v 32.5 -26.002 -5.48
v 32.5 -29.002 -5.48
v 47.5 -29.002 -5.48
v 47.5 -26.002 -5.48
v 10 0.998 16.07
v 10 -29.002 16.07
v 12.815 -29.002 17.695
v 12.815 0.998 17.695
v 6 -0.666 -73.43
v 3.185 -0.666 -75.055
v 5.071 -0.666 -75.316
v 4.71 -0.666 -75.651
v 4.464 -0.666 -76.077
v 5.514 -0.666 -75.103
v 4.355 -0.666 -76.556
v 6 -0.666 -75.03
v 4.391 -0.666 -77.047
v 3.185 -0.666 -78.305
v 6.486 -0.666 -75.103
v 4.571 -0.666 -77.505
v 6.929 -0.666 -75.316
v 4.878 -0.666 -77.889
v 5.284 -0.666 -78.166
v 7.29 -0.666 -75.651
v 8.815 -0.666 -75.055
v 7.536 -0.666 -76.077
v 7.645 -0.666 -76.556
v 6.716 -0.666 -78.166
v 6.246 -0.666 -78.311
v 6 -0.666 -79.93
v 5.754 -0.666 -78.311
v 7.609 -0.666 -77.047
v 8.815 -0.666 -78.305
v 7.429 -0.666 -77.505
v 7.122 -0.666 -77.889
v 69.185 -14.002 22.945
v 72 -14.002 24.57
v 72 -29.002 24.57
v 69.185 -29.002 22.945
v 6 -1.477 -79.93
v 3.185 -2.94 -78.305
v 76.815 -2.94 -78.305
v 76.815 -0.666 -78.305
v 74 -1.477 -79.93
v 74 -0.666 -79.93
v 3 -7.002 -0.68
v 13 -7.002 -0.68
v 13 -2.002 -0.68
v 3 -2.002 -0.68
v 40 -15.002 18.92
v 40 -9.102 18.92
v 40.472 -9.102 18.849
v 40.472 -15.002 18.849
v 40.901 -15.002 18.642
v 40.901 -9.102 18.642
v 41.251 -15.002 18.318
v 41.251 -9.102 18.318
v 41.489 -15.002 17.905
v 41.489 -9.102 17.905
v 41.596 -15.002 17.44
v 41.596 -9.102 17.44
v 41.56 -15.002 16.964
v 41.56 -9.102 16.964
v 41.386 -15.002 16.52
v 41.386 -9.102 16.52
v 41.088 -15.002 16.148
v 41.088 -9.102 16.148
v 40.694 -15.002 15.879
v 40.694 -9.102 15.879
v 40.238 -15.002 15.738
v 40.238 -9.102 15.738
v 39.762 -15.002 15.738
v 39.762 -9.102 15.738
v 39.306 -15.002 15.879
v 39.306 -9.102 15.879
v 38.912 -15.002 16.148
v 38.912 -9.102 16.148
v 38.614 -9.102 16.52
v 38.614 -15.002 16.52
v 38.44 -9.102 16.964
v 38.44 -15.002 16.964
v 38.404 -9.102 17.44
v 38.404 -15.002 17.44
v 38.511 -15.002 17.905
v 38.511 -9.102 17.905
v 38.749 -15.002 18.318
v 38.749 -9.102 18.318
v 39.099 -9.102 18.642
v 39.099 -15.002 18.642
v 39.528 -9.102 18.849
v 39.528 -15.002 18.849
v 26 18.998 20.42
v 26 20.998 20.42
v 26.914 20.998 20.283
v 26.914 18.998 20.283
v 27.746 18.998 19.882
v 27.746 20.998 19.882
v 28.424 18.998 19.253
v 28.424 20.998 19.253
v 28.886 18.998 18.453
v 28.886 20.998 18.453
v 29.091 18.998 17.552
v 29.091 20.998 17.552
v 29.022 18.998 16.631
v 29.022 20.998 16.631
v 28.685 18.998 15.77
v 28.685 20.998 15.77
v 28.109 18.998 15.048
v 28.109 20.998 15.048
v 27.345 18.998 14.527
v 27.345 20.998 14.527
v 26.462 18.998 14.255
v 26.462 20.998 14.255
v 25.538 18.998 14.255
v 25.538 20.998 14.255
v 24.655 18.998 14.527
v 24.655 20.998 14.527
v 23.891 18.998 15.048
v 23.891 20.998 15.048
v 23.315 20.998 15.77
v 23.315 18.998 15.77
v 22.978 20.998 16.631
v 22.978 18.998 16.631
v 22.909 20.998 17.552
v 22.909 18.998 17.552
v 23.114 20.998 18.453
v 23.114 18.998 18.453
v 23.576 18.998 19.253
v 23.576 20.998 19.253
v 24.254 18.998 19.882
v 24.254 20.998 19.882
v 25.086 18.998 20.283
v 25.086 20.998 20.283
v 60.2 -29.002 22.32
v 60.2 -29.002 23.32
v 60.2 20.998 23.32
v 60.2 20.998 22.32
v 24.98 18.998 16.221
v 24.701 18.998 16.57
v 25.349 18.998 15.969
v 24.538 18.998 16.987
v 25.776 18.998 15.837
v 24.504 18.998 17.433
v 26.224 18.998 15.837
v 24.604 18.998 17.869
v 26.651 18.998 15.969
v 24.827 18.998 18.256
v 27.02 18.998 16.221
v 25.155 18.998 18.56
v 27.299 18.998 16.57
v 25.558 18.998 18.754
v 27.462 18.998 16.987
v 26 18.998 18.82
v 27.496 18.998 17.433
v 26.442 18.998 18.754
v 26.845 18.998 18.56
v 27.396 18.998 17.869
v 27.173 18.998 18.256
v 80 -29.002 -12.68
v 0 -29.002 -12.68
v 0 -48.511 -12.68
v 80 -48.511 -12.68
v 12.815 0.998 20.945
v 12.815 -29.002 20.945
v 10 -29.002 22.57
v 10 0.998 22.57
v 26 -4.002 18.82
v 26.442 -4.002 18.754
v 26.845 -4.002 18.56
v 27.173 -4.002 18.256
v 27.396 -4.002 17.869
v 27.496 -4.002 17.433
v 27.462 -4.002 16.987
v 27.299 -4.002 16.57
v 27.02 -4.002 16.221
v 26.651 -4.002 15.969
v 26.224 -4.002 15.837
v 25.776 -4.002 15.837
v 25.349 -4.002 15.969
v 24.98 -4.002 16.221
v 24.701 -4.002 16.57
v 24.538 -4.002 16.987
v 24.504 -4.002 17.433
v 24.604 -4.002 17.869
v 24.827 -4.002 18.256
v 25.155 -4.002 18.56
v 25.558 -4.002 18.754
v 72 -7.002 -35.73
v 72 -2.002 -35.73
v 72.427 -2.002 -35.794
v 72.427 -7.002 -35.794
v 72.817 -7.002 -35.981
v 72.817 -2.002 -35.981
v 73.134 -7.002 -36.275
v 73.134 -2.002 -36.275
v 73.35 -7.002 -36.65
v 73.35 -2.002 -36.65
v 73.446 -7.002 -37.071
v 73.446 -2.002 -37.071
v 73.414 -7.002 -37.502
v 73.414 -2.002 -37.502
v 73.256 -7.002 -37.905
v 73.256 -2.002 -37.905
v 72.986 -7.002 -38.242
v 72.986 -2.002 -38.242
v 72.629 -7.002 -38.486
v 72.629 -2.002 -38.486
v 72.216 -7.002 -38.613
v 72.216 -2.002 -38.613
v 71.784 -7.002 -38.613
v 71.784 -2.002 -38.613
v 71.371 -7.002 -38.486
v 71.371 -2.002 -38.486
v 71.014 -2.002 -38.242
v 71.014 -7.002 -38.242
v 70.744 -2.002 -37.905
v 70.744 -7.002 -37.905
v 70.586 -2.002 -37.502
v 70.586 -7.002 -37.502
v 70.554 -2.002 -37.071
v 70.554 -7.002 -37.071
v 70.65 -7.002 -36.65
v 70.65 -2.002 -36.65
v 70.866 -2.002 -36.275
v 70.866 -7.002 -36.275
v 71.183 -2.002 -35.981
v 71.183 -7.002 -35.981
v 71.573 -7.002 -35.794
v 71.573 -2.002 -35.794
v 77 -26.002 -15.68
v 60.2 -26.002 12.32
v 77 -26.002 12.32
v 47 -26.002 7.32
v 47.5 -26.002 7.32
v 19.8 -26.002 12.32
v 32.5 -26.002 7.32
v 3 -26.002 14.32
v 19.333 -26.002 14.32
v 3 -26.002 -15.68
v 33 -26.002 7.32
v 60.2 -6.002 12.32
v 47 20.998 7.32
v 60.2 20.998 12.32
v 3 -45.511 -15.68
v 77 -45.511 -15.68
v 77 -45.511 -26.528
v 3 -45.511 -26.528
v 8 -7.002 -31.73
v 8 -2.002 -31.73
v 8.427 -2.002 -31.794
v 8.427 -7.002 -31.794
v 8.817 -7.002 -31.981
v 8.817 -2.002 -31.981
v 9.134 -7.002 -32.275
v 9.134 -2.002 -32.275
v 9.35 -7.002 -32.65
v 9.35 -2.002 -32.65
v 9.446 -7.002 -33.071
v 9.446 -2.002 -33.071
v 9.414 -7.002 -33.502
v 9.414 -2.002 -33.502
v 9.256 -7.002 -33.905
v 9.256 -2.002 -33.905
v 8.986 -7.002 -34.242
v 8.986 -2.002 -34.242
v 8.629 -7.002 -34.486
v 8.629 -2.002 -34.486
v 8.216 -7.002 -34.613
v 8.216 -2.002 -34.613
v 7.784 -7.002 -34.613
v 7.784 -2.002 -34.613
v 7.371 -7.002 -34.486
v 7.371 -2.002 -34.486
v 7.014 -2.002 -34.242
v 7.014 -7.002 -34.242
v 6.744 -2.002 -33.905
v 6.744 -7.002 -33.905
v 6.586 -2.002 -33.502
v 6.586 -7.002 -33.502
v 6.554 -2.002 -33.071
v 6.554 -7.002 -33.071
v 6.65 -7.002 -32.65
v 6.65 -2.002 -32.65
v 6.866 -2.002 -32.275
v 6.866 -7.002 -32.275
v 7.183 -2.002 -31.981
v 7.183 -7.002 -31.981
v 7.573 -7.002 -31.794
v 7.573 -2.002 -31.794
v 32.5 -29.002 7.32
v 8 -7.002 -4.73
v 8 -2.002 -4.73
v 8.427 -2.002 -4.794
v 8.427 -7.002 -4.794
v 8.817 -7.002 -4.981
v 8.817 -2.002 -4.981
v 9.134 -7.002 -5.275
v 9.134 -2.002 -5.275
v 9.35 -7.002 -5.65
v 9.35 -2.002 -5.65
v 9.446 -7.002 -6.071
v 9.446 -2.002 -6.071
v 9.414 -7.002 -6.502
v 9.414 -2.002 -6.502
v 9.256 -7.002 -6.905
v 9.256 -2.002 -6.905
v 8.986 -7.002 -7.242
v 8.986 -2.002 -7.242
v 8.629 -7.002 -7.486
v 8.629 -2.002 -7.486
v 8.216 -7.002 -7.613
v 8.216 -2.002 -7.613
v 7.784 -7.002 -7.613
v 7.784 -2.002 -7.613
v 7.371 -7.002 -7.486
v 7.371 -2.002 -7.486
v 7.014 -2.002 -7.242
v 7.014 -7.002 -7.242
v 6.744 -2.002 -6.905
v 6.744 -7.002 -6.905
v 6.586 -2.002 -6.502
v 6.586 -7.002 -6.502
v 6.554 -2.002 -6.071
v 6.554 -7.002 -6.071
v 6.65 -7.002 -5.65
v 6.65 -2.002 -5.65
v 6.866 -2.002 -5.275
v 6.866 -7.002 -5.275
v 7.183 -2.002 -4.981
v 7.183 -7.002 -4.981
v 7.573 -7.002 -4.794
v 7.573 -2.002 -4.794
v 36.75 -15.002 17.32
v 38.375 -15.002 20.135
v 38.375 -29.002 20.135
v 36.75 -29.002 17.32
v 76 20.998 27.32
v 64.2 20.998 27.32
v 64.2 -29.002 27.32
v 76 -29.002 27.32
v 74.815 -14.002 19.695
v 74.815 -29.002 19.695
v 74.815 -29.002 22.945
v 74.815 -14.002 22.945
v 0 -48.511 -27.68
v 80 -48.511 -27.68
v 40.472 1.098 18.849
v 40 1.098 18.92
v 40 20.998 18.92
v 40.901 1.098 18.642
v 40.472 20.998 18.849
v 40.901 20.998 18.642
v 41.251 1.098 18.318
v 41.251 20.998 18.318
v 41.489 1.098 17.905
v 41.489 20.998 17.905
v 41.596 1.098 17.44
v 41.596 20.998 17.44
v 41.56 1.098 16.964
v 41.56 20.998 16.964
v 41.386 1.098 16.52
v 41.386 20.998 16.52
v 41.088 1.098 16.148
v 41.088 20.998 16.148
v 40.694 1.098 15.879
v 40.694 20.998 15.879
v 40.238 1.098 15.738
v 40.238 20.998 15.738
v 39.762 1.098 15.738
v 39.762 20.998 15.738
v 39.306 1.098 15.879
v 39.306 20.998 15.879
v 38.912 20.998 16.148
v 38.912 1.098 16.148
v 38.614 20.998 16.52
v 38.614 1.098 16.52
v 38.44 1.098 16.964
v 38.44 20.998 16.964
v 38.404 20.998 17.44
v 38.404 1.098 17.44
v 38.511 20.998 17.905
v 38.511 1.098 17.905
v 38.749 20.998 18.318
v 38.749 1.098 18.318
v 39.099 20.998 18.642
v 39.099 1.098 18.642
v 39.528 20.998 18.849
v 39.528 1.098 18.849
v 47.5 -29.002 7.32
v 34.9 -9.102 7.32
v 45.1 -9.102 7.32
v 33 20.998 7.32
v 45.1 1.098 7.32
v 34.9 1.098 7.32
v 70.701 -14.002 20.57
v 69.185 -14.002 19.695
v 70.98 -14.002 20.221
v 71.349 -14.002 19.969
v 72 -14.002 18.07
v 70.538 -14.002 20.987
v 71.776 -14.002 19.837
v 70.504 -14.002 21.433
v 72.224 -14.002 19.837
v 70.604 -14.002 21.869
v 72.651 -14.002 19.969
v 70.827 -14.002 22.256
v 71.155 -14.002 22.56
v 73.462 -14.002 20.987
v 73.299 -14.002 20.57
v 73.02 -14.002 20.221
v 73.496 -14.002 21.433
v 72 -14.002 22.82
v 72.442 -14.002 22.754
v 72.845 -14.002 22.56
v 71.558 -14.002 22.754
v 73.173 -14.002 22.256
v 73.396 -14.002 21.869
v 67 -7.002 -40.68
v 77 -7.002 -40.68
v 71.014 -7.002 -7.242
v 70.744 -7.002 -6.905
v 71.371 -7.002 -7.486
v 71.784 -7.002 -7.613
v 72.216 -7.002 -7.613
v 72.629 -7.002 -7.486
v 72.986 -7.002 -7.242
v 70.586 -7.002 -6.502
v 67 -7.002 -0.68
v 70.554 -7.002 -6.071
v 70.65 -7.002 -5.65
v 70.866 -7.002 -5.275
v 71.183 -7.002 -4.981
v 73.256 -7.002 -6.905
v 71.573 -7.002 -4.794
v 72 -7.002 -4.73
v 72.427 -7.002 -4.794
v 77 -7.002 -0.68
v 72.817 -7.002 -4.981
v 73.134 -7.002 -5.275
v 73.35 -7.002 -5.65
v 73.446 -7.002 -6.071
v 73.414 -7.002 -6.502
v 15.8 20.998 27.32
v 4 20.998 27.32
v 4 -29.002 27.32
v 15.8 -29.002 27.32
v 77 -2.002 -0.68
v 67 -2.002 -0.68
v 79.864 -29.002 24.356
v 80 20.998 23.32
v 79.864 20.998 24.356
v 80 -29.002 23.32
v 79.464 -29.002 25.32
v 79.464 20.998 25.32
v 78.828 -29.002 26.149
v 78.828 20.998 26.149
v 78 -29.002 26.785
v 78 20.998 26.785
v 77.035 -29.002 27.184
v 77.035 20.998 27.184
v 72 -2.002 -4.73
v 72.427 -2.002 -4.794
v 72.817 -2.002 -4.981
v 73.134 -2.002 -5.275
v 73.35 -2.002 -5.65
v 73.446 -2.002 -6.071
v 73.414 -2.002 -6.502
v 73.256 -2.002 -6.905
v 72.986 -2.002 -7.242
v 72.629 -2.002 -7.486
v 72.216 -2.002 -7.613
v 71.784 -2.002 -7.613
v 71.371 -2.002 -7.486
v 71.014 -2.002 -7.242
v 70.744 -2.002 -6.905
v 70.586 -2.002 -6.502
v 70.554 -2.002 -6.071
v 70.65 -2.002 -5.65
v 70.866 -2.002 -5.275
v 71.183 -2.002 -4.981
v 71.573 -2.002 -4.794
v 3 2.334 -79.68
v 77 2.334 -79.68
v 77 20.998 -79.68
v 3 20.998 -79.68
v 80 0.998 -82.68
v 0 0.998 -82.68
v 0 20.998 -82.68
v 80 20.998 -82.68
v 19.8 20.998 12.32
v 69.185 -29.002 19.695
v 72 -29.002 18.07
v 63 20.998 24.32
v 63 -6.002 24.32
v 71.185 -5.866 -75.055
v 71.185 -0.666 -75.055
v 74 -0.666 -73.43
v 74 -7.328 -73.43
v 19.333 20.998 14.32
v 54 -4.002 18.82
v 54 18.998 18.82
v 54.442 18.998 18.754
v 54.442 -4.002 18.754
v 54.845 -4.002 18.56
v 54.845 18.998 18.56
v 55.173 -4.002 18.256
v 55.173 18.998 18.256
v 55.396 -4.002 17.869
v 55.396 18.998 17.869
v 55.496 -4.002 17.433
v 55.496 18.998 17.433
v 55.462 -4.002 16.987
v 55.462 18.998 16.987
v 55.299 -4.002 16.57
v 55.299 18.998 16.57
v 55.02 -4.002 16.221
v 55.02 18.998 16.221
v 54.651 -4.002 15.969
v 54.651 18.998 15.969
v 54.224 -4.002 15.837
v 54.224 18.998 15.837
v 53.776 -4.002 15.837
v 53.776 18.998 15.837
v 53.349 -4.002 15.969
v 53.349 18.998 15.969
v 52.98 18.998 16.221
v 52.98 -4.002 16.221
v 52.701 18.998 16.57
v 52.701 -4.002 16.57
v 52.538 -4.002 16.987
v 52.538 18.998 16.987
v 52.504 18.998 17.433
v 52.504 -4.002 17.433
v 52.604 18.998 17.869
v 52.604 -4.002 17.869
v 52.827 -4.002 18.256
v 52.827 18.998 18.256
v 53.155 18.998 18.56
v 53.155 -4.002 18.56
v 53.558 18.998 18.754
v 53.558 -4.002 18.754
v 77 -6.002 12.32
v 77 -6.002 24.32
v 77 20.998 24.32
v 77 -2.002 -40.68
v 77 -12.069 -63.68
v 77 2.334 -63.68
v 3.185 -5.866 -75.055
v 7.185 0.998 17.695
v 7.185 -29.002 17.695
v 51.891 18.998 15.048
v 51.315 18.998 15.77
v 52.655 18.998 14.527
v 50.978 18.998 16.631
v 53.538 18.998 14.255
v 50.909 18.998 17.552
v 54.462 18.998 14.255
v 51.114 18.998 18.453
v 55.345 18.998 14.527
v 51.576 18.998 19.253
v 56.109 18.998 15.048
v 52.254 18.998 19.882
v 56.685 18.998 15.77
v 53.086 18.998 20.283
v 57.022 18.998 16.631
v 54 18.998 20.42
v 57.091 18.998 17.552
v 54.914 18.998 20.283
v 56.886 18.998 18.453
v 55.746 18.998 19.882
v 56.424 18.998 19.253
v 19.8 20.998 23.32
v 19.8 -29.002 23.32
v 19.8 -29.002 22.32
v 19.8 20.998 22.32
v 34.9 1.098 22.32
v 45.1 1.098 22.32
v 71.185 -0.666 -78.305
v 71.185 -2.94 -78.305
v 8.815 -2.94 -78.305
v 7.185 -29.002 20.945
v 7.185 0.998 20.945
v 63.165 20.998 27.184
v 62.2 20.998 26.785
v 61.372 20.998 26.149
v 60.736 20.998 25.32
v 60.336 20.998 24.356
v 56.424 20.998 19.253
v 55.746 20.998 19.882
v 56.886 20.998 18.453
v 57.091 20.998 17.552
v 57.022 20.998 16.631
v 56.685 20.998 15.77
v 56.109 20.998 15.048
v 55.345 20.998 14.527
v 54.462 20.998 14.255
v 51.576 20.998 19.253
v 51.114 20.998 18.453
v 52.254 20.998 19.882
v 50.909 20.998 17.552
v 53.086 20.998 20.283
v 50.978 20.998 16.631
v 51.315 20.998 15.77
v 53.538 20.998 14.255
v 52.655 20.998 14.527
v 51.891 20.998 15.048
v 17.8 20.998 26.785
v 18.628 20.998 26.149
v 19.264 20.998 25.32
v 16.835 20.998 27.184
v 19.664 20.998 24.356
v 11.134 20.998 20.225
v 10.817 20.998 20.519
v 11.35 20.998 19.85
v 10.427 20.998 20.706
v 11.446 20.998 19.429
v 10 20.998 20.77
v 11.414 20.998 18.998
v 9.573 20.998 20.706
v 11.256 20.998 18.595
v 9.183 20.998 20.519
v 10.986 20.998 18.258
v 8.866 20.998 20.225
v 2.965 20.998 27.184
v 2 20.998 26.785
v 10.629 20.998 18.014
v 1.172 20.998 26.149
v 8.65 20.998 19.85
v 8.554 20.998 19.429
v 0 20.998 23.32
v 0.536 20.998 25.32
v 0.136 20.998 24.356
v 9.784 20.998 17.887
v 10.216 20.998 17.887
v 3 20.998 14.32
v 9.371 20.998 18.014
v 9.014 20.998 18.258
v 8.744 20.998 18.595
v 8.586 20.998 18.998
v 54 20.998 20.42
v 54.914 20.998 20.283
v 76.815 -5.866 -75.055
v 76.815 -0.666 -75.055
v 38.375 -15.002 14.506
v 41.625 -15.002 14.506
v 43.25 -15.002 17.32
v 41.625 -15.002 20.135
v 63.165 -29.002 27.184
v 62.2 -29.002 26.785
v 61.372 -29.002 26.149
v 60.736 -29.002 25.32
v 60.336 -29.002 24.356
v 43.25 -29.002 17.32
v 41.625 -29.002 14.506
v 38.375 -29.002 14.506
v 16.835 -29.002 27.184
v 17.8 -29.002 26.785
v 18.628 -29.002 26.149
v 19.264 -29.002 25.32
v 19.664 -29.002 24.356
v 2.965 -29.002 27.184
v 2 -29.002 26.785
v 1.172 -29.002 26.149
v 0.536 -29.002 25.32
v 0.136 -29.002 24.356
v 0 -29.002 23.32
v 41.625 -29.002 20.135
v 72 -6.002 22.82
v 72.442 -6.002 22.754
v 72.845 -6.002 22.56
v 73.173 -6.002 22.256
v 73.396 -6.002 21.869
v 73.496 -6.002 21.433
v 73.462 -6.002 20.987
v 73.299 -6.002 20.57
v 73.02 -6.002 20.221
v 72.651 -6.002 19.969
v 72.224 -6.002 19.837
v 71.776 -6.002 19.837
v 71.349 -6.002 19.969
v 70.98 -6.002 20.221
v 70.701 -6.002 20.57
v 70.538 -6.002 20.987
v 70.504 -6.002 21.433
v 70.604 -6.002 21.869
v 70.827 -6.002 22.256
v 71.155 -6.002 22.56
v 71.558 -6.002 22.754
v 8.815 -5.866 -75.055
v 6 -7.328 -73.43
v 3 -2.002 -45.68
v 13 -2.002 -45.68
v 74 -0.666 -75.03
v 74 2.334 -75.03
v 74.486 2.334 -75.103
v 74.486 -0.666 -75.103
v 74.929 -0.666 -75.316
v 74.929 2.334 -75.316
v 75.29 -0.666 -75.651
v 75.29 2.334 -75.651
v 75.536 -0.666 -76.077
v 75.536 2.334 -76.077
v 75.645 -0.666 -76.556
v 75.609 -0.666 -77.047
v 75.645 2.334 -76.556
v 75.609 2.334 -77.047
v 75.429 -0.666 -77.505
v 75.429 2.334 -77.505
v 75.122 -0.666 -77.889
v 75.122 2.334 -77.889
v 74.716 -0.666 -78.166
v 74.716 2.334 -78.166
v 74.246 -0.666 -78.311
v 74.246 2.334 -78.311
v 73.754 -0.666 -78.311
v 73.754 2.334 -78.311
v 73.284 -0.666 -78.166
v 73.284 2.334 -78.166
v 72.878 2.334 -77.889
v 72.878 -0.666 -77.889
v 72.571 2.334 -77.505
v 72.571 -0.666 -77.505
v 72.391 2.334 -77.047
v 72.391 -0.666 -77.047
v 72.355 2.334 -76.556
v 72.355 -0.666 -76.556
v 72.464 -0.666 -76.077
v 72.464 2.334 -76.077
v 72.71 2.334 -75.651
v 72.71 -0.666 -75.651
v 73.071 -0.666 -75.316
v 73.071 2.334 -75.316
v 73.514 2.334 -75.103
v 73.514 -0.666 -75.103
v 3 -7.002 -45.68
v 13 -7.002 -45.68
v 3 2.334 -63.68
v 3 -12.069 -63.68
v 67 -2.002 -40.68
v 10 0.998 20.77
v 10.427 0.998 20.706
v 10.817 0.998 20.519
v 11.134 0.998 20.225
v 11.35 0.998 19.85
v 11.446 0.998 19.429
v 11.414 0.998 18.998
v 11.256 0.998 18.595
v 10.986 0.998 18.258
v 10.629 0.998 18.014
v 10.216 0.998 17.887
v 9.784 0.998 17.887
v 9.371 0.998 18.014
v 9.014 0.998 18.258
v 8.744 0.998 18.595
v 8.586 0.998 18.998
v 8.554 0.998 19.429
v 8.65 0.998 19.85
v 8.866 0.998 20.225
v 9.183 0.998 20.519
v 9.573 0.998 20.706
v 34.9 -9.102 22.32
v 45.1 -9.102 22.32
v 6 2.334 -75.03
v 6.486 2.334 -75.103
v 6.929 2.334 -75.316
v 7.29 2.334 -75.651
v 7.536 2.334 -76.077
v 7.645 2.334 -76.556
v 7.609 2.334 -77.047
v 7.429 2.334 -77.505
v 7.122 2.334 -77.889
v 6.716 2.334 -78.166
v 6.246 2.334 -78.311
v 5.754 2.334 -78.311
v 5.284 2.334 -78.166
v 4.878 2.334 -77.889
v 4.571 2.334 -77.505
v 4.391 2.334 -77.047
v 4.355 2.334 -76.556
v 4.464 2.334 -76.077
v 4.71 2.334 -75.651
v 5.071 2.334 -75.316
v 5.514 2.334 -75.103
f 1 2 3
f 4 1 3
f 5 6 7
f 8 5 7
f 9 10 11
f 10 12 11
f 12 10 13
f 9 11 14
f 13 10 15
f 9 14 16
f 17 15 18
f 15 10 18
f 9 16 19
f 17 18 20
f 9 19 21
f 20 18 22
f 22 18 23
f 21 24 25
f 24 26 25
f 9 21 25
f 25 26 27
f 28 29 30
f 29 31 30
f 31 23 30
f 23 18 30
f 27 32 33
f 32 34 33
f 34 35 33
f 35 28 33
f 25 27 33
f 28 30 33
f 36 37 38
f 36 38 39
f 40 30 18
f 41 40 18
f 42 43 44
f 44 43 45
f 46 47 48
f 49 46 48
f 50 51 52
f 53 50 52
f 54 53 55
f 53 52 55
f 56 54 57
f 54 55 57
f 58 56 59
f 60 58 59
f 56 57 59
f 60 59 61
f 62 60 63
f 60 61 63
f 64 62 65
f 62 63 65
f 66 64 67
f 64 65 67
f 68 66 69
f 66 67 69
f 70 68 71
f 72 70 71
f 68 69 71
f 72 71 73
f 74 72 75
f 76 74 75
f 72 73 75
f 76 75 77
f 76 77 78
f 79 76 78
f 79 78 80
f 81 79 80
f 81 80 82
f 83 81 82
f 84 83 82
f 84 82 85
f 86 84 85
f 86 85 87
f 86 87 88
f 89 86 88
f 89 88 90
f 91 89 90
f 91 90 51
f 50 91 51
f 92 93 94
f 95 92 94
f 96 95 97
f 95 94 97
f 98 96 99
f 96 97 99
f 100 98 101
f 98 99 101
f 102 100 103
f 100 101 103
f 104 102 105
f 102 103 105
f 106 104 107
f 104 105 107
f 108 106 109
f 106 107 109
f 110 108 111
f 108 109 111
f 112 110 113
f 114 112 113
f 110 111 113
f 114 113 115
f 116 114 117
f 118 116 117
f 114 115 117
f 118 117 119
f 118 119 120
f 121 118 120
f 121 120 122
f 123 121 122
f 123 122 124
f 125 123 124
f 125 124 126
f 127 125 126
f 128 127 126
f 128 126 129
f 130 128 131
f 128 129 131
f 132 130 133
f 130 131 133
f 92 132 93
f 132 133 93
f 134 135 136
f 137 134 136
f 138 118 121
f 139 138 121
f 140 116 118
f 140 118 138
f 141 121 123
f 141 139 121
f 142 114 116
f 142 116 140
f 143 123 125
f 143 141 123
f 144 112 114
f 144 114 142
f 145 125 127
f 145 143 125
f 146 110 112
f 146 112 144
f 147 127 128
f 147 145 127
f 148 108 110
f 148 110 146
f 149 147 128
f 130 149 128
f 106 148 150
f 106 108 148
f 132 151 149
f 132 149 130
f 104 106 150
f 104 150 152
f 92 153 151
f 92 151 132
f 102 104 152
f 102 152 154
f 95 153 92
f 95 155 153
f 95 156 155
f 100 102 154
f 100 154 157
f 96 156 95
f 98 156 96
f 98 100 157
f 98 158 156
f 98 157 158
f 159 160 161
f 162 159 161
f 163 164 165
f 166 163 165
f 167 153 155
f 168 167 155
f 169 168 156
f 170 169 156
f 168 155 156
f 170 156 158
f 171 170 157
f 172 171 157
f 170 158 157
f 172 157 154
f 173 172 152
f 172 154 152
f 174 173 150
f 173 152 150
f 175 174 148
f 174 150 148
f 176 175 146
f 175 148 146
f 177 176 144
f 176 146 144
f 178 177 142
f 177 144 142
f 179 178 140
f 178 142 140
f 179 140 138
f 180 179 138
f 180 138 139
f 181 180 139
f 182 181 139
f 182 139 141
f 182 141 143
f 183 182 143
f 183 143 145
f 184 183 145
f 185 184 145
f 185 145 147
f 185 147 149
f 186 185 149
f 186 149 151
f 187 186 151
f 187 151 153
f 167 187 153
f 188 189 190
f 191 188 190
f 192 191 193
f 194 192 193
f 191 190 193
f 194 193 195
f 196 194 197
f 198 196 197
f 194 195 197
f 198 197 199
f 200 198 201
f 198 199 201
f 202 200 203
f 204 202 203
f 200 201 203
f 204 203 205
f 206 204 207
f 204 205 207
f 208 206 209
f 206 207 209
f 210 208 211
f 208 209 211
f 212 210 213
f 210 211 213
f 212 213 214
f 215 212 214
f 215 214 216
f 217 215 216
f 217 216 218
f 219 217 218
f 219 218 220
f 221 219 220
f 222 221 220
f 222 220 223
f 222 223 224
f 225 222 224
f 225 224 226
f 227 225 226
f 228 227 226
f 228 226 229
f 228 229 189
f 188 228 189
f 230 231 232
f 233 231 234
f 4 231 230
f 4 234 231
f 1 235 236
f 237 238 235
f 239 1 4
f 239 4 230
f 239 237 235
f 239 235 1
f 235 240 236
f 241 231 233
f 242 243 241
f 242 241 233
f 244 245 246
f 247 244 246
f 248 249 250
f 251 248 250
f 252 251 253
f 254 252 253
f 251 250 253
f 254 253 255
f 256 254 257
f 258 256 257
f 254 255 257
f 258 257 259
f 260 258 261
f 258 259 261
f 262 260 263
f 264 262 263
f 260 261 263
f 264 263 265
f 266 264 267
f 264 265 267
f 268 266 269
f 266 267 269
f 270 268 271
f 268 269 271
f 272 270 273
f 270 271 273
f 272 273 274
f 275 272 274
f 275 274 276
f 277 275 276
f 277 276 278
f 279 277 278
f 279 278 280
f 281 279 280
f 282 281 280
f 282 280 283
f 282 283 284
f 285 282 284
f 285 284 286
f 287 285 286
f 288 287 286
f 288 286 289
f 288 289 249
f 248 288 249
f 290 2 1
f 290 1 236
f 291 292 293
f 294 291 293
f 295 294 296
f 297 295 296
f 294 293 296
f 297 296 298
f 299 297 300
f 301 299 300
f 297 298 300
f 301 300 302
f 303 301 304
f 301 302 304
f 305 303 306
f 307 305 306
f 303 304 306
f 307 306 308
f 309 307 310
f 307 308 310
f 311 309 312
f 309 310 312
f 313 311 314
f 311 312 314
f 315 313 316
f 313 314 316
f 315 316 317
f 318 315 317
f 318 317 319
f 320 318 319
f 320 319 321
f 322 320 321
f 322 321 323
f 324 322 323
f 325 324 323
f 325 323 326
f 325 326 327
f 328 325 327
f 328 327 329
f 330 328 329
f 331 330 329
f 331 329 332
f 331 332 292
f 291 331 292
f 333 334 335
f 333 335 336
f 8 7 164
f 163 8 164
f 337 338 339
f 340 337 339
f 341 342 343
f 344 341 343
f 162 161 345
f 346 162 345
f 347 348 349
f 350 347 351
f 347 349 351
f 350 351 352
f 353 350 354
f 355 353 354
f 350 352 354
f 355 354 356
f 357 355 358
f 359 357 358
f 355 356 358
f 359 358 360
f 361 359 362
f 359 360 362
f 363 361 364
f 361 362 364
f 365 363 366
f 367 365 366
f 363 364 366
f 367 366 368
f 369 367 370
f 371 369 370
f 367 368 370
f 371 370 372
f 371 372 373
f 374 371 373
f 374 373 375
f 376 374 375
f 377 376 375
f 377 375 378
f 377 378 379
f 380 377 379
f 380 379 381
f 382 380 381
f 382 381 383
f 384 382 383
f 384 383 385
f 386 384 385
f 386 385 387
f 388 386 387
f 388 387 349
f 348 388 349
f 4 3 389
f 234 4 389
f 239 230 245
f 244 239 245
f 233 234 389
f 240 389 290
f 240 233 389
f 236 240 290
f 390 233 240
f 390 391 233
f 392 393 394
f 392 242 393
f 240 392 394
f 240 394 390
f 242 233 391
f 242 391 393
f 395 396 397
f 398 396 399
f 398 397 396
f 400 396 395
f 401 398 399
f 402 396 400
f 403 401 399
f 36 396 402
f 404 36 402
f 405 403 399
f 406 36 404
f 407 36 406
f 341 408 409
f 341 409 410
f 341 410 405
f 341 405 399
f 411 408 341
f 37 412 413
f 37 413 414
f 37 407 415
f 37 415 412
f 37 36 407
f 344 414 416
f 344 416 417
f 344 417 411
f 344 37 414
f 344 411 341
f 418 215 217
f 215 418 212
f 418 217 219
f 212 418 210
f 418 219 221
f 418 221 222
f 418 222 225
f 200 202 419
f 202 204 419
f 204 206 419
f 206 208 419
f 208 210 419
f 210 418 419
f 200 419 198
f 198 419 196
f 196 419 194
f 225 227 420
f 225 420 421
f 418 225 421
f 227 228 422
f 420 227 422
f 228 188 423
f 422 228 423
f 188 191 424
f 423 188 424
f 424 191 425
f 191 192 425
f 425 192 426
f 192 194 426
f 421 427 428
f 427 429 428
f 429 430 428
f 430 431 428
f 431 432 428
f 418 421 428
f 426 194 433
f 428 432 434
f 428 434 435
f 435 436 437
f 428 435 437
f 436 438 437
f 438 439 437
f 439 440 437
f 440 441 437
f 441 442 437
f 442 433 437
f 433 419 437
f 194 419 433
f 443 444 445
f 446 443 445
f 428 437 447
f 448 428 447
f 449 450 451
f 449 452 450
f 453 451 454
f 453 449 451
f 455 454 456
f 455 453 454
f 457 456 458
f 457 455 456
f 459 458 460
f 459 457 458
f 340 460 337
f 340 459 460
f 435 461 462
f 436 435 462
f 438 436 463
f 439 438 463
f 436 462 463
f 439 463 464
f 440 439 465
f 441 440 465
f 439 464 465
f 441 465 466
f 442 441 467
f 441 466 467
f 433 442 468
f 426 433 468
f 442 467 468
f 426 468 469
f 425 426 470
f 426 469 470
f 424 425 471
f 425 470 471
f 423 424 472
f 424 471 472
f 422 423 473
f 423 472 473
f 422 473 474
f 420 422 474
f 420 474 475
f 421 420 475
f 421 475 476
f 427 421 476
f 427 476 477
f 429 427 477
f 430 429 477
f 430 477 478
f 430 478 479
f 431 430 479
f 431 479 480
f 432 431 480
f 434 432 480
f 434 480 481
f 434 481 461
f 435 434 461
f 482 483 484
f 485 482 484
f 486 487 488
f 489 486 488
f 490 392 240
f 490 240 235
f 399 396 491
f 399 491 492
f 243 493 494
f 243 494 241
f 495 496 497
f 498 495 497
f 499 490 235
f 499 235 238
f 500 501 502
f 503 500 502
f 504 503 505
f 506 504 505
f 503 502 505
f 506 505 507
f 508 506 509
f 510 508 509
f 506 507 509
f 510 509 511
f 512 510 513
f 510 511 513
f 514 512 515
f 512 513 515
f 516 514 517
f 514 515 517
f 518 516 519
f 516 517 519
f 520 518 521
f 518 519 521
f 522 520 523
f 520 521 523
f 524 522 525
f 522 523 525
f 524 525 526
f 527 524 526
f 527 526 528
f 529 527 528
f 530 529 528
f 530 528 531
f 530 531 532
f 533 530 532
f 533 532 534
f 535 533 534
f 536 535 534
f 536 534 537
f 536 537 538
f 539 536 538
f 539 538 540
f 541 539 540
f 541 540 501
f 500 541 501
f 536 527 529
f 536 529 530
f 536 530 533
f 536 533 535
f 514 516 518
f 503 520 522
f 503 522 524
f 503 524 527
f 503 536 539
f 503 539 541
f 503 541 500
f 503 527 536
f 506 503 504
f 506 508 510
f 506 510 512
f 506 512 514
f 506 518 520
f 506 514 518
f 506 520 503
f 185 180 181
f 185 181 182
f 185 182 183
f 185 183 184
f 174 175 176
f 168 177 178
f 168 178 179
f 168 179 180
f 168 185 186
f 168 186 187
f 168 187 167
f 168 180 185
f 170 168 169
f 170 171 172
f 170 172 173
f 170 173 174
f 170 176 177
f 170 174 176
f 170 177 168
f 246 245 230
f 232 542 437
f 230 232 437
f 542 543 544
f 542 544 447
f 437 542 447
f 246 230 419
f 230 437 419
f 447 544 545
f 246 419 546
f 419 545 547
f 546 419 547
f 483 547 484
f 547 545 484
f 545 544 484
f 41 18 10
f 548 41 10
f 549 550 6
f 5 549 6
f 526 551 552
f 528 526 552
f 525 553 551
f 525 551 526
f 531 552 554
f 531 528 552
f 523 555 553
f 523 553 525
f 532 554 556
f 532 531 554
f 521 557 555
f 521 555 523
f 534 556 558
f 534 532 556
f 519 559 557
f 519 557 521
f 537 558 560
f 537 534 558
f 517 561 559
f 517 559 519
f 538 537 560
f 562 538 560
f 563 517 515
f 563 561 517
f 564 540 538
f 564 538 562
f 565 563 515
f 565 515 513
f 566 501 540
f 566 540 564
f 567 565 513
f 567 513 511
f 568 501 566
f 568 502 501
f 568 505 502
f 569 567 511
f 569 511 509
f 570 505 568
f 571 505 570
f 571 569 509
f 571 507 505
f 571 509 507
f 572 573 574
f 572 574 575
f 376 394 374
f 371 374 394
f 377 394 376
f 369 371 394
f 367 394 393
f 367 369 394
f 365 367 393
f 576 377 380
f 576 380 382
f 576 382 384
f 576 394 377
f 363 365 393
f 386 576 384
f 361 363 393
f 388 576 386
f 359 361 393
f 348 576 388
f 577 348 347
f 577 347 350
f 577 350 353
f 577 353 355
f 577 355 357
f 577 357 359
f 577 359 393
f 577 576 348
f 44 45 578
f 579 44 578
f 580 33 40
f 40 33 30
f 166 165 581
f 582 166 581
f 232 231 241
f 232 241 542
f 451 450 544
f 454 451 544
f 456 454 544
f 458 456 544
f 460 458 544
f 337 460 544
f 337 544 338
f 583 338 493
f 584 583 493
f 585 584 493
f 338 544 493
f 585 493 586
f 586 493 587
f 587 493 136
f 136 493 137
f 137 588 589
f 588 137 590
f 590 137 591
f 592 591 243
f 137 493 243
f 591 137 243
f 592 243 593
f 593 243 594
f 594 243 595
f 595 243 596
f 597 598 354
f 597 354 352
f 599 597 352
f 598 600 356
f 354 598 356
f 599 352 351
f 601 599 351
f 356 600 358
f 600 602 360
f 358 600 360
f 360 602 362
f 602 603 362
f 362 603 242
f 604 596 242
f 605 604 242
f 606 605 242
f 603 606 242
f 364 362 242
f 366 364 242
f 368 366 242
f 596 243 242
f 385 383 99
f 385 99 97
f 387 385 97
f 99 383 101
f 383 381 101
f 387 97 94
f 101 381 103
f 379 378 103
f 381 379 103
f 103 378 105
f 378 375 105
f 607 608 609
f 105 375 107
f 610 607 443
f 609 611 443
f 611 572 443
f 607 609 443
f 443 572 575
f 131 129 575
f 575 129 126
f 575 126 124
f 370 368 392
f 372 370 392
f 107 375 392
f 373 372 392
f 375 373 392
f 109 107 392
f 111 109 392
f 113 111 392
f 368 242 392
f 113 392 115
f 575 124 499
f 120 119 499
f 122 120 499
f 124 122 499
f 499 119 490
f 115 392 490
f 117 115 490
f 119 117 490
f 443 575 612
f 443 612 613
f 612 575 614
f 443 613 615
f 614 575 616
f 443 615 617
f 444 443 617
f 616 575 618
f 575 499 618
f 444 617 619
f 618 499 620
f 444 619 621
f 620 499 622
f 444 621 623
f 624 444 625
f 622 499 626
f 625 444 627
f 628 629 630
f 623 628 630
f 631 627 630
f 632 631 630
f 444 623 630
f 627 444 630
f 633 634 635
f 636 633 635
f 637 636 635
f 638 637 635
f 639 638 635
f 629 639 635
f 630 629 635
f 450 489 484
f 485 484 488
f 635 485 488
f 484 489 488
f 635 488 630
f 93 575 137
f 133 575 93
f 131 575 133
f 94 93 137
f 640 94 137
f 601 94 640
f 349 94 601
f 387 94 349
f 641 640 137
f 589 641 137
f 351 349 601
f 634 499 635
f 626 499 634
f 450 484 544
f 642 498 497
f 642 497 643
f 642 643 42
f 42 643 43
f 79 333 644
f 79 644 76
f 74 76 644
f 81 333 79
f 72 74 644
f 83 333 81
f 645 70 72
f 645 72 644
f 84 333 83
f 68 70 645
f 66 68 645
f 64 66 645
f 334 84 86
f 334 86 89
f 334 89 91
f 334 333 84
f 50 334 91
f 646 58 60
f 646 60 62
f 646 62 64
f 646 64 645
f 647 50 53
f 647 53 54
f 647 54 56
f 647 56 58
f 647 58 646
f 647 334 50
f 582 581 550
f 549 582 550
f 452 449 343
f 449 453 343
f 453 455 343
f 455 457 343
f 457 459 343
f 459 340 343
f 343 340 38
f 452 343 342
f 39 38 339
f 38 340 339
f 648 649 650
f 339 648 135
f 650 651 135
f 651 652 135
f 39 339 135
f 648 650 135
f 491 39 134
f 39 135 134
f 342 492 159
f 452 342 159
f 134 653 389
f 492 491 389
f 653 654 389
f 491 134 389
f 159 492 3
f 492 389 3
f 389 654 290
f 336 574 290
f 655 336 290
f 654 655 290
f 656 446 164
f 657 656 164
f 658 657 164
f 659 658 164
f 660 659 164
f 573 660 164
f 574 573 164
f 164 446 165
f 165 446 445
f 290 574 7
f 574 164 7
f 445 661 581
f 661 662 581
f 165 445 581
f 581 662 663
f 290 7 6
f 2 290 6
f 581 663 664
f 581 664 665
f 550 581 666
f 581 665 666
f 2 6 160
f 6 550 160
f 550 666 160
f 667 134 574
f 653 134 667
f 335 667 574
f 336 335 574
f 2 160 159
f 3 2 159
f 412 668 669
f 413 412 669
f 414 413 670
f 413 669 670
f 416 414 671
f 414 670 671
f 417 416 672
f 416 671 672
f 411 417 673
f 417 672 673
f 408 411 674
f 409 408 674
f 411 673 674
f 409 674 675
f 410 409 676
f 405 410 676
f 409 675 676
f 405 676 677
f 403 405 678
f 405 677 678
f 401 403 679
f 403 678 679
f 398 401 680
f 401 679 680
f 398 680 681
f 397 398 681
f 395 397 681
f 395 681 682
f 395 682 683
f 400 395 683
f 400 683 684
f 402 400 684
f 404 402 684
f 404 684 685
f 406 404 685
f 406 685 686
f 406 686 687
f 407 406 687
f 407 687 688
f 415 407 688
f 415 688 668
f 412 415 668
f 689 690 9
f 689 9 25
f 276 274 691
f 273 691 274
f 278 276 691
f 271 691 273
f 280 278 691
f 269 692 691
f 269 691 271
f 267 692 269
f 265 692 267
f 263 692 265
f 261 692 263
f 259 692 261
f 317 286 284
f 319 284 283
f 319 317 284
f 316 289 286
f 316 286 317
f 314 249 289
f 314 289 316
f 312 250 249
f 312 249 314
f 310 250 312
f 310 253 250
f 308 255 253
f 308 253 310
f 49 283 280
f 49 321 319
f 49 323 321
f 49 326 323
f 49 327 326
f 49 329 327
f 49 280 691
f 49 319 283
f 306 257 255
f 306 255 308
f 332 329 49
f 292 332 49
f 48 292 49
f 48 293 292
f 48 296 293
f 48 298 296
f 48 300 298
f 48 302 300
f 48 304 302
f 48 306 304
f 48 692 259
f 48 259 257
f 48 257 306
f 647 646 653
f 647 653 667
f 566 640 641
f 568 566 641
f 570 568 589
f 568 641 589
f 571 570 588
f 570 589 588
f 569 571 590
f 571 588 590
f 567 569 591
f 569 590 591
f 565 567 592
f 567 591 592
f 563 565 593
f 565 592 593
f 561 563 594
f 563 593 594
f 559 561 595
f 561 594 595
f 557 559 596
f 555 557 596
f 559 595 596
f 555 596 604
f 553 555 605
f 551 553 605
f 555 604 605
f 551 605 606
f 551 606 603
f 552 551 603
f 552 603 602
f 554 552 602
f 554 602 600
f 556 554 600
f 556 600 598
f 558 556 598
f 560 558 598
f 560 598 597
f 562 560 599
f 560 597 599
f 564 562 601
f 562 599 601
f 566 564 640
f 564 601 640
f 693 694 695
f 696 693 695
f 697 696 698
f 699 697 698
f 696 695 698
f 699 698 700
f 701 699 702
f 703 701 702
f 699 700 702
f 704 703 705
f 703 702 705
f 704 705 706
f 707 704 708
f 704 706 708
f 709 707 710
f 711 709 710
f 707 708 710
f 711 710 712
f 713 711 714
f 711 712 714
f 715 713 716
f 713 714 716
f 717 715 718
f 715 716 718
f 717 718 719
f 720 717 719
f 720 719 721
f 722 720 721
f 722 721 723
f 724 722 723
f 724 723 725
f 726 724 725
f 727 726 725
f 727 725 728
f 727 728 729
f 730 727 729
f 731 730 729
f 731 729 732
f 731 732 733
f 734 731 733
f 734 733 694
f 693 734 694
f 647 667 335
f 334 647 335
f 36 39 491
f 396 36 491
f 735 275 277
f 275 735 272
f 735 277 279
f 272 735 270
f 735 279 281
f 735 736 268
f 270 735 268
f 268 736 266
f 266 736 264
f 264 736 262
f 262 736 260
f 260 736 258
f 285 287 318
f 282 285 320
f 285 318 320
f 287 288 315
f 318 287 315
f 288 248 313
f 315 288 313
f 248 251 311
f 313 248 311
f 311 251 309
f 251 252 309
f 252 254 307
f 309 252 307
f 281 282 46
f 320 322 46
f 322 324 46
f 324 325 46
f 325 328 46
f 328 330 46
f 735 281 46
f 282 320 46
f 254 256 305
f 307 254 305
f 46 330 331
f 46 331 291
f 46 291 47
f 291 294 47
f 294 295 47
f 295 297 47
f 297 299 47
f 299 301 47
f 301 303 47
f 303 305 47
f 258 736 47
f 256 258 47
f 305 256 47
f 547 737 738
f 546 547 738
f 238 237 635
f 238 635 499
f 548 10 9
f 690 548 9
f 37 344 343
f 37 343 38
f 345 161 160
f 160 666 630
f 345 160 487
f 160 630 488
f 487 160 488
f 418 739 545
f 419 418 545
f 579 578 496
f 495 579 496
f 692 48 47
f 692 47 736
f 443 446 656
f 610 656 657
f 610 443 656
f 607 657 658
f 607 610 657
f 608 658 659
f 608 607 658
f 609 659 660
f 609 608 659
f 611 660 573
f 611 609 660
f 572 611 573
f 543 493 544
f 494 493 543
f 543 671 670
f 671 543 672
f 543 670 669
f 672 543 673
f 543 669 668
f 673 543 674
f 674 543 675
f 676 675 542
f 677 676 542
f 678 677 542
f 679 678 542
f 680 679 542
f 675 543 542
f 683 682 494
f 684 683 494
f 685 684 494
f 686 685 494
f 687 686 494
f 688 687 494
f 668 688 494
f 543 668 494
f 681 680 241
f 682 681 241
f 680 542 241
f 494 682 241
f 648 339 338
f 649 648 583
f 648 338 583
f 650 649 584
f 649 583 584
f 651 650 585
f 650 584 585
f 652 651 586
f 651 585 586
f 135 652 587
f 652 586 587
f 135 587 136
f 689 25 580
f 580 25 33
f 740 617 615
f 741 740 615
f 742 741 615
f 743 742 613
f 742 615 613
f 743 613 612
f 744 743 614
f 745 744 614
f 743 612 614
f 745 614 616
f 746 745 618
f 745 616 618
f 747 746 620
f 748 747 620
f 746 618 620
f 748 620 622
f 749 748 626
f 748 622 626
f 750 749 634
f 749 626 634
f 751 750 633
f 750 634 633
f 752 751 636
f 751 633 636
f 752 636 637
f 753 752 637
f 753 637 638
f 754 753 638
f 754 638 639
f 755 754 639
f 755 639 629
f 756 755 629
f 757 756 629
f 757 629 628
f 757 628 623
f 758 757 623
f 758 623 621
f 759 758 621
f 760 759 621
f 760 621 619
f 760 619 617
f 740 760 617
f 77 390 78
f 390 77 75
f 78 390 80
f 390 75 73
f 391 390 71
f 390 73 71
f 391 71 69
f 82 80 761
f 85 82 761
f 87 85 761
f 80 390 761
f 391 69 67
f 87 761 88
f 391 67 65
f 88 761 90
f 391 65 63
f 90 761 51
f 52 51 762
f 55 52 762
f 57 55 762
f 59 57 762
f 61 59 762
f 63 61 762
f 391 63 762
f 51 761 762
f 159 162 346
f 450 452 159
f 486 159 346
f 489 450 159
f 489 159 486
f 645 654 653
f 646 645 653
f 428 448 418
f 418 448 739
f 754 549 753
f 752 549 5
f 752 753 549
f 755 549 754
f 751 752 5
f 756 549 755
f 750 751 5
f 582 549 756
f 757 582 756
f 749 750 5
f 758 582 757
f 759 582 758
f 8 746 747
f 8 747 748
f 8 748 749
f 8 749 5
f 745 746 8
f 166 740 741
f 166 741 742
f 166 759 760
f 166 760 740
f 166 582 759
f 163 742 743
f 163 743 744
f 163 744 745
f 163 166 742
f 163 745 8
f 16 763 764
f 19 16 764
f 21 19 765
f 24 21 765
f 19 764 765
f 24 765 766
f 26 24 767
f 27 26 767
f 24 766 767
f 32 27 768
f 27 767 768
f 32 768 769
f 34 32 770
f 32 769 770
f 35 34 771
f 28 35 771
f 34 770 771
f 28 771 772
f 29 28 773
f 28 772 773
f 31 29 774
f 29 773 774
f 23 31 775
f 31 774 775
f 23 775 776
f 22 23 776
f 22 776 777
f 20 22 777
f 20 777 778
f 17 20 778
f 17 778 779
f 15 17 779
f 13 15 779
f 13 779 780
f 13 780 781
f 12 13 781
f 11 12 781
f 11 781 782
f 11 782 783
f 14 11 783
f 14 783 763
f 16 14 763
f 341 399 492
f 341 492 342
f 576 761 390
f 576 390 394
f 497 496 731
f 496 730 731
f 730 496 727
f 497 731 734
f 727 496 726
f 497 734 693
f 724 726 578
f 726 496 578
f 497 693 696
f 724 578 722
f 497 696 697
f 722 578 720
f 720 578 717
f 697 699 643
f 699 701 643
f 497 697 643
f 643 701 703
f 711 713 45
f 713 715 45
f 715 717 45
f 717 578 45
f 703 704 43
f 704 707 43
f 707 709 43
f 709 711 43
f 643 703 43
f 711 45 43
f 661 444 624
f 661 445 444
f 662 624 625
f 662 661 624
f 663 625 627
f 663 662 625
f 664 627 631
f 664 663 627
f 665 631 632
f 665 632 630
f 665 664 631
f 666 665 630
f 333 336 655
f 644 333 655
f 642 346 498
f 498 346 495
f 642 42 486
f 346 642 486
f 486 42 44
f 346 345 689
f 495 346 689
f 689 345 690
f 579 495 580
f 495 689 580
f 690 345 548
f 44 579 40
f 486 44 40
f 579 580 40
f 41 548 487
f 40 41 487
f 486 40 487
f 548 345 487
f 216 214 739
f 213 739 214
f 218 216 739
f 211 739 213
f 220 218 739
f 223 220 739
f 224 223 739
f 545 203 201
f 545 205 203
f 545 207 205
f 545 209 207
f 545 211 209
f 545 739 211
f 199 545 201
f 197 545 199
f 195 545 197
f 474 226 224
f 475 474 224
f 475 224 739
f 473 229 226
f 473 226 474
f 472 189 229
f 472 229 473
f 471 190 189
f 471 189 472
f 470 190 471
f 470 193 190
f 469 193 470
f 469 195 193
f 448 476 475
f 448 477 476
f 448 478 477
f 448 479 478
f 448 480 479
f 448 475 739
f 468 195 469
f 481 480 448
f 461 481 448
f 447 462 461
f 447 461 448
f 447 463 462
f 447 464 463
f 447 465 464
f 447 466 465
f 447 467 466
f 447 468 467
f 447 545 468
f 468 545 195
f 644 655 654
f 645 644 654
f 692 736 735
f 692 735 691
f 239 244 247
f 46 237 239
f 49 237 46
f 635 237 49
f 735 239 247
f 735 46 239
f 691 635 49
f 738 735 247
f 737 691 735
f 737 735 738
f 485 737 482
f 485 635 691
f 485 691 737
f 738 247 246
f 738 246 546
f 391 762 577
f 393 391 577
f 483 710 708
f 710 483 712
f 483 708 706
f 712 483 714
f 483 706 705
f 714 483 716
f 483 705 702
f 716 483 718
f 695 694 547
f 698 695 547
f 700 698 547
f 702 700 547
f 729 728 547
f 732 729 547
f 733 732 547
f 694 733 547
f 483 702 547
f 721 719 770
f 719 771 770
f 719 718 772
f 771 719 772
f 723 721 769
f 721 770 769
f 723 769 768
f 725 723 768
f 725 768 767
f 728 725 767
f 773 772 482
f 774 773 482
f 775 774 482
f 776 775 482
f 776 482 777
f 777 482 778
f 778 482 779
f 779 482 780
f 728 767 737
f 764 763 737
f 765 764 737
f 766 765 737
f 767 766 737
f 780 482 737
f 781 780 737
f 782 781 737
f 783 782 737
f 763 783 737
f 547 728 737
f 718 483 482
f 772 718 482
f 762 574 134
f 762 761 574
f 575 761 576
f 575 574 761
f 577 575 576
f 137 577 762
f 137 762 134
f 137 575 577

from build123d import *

# Parameters (mm, degrees)
BOSS_EXTRUDE1_DEPTH = 80
SHELL1_T            = -3
SKETCH3_W           = 46
SKETCH3_H           = 47
BOSS_EXTRUDE2_DEPTH = 17
SKETCH4_W           = 10.2
SKETCH4_H           = 10.2
CUT_EXTRUDE1_DEPTH  = 20
SKETCH6_W           = 15
SKETCH6_H           = 12.8
CUT_EXTRUDE2_DEPTH  = 3
SKETCH7_W           = 40.4
SKETCH7_H           = 50
CUT_EXTRUDE3_DEPTH  = 5
FILLET1_R           = 4
CUT_EXTRUDE7_DEPTH  = 47
SKETCH13_R          = 1.5
CUT_EXTRUDE8_DEPTH  = 25
SKETCH14_R          = 3.1
CUT_EXTRUDE9_DEPTH  = 2
SKETCH17_W          = 45
SKETCH17_H          = 5
BOSS_EXTRUDE5_DEPTH = 74
CUT_EXTRUDE10_REACH = 126.093
SKETCH18_W          = 54
SKETCH18_H          = 45
CUT_EXTRUDE11_REACH = 126.093
SKETCH19_R          = 1.45
BOSS_EXTRUDE6_DEPTH = 47
SKETCH22_R          = 1.45
CUT_EXTRUDE12_DEPTH = 135.415364765
BOSS_EXTRUDE7_DEPTH = 74
SKETCH27_R          = 1.65
CUT_EXTRUDE14_DEPTH = 10
CUT_EXTRUDE15_START = -3
CUT_EXTRUDE15_DEPTH = 32
CUT_EXTRUDE16_DEPTH = 30
BOSS_EXTRUDE8_DEPTH = 20
SKETCH31_R          = 1.5
CUT_EXTRUDE17_DEPTH = 123.649786567
CUT_EXTRUDE18_DEPTH = 15
CUT_EXTRUDE19_REACH = 126.093
SKETCH33_W          = 10
SKETCH33_H          = 5
SKETCH34_R          = 1.6
CUT_EXTRUDE20_DEPTH = 135.415364765
CUT_EXTRUDE22_DEPTH = 14


with BuildPart() as part:
    # Sketch2 → Boss-Extrude1 (new body)
    with BuildSketch(Plane(origin=(0, 0, 0), x_dir=(0, 0, -1), z_dir=(1, 0, 0))):
        Polygon((-27.320490368, 20.998248687), (-27.320490368, -29.001751313), (12.679509632, -29.001751313), (12.679509632, -48.511383538), (27.679509632, -48.511383538), (82.679509632, 0.998248687), (82.679509632, 20.998248687), align=None)
    extrude(amount=BOSS_EXTRUDE1_DEPTH)

    # Shell1
    shell1_openings = [part.faces().sort_by_distance(p)[0] for p in [
        (40, 20.998248687, -27.679509632),
    ]]
    offset(amount=SHELL1_T, openings=shell1_openings, kind=Kind.INTERSECTION)

    # Sketch3 → Boss-Extrude2 (add)
    with BuildSketch(Plane(origin=(0, 0, 24.320490368), x_dir=(-1, 0, 0), z_dir=(0, 0, -1))):
        with Locations((-40, -2.501751313)):
            Rectangle(SKETCH3_W, SKETCH3_H)
    extrude(amount=BOSS_EXTRUDE2_DEPTH)

    # Sketch4 → Cut-Extrude1 (cut)
    with BuildSketch(Plane.XY.offset(27.320490368)):
        with Locations((40, -4.001751313)):
            Rectangle(SKETCH4_W, SKETCH4_H)
    extrude(amount=-CUT_EXTRUDE1_DEPTH, mode=Mode.SUBTRACT)

    # Sketch6 → Cut-Extrude2 (cut)
    with BuildSketch(Plane.XZ.offset(29.001751313)):
        with Locations((40, 0.920490368)):
            Rectangle(SKETCH6_W, SKETCH6_H)
    extrude(amount=-CUT_EXTRUDE2_DEPTH, mode=Mode.SUBTRACT)

    # Sketch7 → Cut-Extrude3 (cut)
    with BuildSketch(Plane.XY.offset(27.320490368)):
        with Locations((40, -4.001751313)):
            Rectangle(SKETCH7_W, SKETCH7_H)
    extrude(amount=-CUT_EXTRUDE3_DEPTH, mode=Mode.SUBTRACT)

    # Fillet1
    fillet1_edges = [part.edges().sort_by_distance(p)[0] for p in [
        (80, -4.001751313, 27.320490368),
        (19.8, -4.001751313, 27.320490368),
        (0, -4.001751313, 27.320490368),
        (60.2, -4.001751313, 27.320490368),
    ]]
    fillet(fillet1_edges, radius=FILLET1_R)

    # Sketch12 → Cut-Extrude7 (cut)
    with BuildSketch(Plane(origin=(0, 20.998248687, 0), x_dir=(1, 0, 0), z_dir=(0, 1, 0))):
        Polygon((33, -7.320490368), (19.8, -12.320490368), (17, -24.320490368), (17, -7.320490368), align=None)
        Polygon((47, -7.320490368), (63, -7.320490368), (63, -24.320490368), (60.2, -12.320490368), align=None)
    extrude(amount=-CUT_EXTRUDE7_DEPTH, mode=Mode.SUBTRACT)

    # Sketch13 → Cut-Extrude8 (cut)
    with BuildSketch(Plane(origin=(0, 20.998248687, 0), x_dir=(1, 0, 0), z_dir=(0, 1, 0))):
        with Locations(Location((26, -17.320490368, 0), (0, 0, 270))):
            Circle(SKETCH13_R)
        with Locations(Location((54, -17.320490368, 0), (0, 0, 270))):
            Circle(SKETCH13_R)
    extrude(amount=-CUT_EXTRUDE8_DEPTH, mode=Mode.SUBTRACT)

    # Sketch14 → Cut-Extrude9 (cut)
    with BuildSketch(Plane(origin=(0, 20.998248687, 0), x_dir=(1, 0, 0), z_dir=(0, 1, 0))):
        with Locations(Location((26, -17.320490368, 0), (0, 0, 270))):
            Circle(SKETCH14_R)
        with Locations(Location((54, -17.320490368, 0), (0, 0, 270))):
            Circle(SKETCH14_R)
    extrude(amount=-CUT_EXTRUDE9_DEPTH, mode=Mode.SUBTRACT)

    # Sketch17 → Boss-Extrude5 (add)
    with BuildSketch(Plane.ZY.offset(-77)):
        with Locations((-23.179509632, -4.501751313)):
            Rectangle(SKETCH17_W, SKETCH17_H)
    extrude(amount=BOSS_EXTRUDE5_DEPTH)

    # Sketch18 → Cut-Extrude10 (cut, up to next)
    with BuildSketch(Plane(origin=(0, -2.001751313, 0), x_dir=(1, 0, 0), z_dir=(0, 1, 0)), mode=Mode.PRIVATE) as cut_extrude10_sk1:
        with Locations((40, 23.179509632)):
            Rectangle(SKETCH18_W, SKETCH18_H)
    cut_extrude10_tool1 = extrude(cut_extrude10_sk1.sketch, amount=-CUT_EXTRUDE10_REACH, mode=Mode.PRIVATE) & part.part
    add(cut_extrude10_tool1.solids().sort_by_distance((40, -2.001751, -23.17951))[0], mode=Mode.SUBTRACT)

    # Sketch19 → Cut-Extrude11 (cut, up to next)
    with BuildSketch(Plane(origin=(0, -2.001751313, 0), x_dir=(1, 0, 0), z_dir=(0, 1, 0)), mode=Mode.PRIVATE) as cut_extrude11_sk1:
        with Locations(Location((72, 37.179509632, 0), (0, 0, 270))):
            Circle(SKETCH19_R)
    cut_extrude11_tool1 = extrude(cut_extrude11_sk1.sketch, amount=-CUT_EXTRUDE11_REACH, mode=Mode.PRIVATE) & part.part
    # Sketch19 → Cut-Extrude11 (cut, up to next)
    with BuildSketch(Plane(origin=(0, -2.001751313, 0), x_dir=(1, 0, 0), z_dir=(0, 1, 0)), mode=Mode.PRIVATE) as cut_extrude11_sk2:
        with Locations(Location((72, 6.179509632, 0), (0, 0, 270))):
            Circle(SKETCH19_R)
    cut_extrude11_tool2 = extrude(cut_extrude11_sk2.sketch, amount=-CUT_EXTRUDE11_REACH, mode=Mode.PRIVATE) & part.part
    # Sketch19 → Cut-Extrude11 (cut, up to next)
    with BuildSketch(Plane(origin=(0, -2.001751313, 0), x_dir=(1, 0, 0), z_dir=(0, 1, 0)), mode=Mode.PRIVATE) as cut_extrude11_sk3:
        with Locations(Location((8, 33.179509632, 0), (0, 0, 270))):
            Circle(SKETCH19_R)
    cut_extrude11_tool3 = extrude(cut_extrude11_sk3.sketch, amount=-CUT_EXTRUDE11_REACH, mode=Mode.PRIVATE) & part.part
    # Sketch19 → Cut-Extrude11 (cut, up to next)
    with BuildSketch(Plane(origin=(0, -2.001751313, 0), x_dir=(1, 0, 0), z_dir=(0, 1, 0)), mode=Mode.PRIVATE) as cut_extrude11_sk4:
        with Locations(Location((8, 6.179509632, 0), (0, 0, 270))):
            Circle(SKETCH19_R)
    cut_extrude11_tool4 = extrude(cut_extrude11_sk4.sketch, amount=-CUT_EXTRUDE11_REACH, mode=Mode.PRIVATE) & part.part
    add(cut_extrude11_tool1.solids().sort_by_distance((72, -2.001751, -37.17951))[0], mode=Mode.SUBTRACT)
    add(cut_extrude11_tool2.solids().sort_by_distance((72, -2.001751, -6.17951))[0], mode=Mode.SUBTRACT)
    add(cut_extrude11_tool3.solids().sort_by_distance((8, -2.001751, -33.17951))[0], mode=Mode.SUBTRACT)
    add(cut_extrude11_tool4.solids().sort_by_distance((8, -2.001751, -6.17951))[0], mode=Mode.SUBTRACT)

    # Sketch21 → Boss-Extrude6 (add)
    with BuildSketch(Plane(origin=(0, -26.001751313, 0), x_dir=(1, 0, 0), z_dir=(0, 1, 0))):
        Polygon((3, -24.320490368), (3, -14.320490368), (19.333333333, -14.320490368), (17, -24.320490368), align=None)
    extrude(amount=BOSS_EXTRUDE6_DEPTH)

    # Sketch22 → Cut-Extrude12 (cut, through all)
    with BuildSketch(Plane(origin=(0, 20.998248687, 0), x_dir=(1, 0, 0), z_dir=(0, 1, 0))):
        with Locations(Location((10, -19.320490368, 0), (0, 0, 270))):
            Circle(SKETCH22_R)
    extrude(amount=-CUT_EXTRUDE12_DEPTH, mode=Mode.SUBTRACT)

    # Sketch26 → Boss-Extrude7 (add)
    with BuildSketch(Plane(origin=(3, 0, 0), x_dir=(0, 0, -1), z_dir=(1, 0, 0))):
        Polygon((79.679509632, 2.334161996), (63.679509632, 2.334161996), (63.679509632, -12.068640106), align=None)
    extrude(amount=BOSS_EXTRUDE7_DEPTH)

    # Sketch27 → Cut-Extrude14 (cut)
    with BuildSketch(Plane(origin=(0, 2.334161996, 0), x_dir=(1, 0, 0), z_dir=(0, 1, 0))):
        with Locations(Location((6, 76.679509632, 0), (0, 0, 270))):
            Circle(SKETCH27_R)
        with Locations(Location((74, 76.679509632, 0), (0, 0, 270))):
            Circle(SKETCH27_R)
    extrude(amount=-CUT_EXTRUDE14_DEPTH, mode=Mode.SUBTRACT)

    # Sketch28 → Cut-Extrude15 (cut)
    with BuildSketch(Plane(origin=(0, 2.334161996, 0), x_dir=(1, 0, 0), z_dir=(0, 1, 0)).offset(CUT_EXTRUDE15_START)):
        Polygon((74, 79.929509632), (71.185417438, 78.304509632), (71.185417438, 75.054509632), (74, 73.429509632), (76.814582562, 75.054509632), (76.814582562, 78.304509632), align=None)
        Polygon((6, 73.429509632), (8.814582562, 75.054509632), (8.814582562, 78.304509632), (6, 79.929509632), (3.185417438, 78.304509632), (3.185417438, 75.054509632), align=None)
    extrude(amount=-CUT_EXTRUDE15_DEPTH, mode=Mode.SUBTRACT)

    # Sketch29 → Cut-Extrude16 (cut)
    with BuildSketch(Plane.XZ.offset(29.001751313)):
        Polygon((7.185417438, 17.695490368), (10, 16.070490368), (12.814582562, 17.695490368), (12.814582562, 20.945490368), (10, 22.570490368), (7.185417438, 20.945490368), align=None)
    extrude(amount=-CUT_EXTRUDE16_DEPTH, mode=Mode.SUBTRACT)

    # Sketch30 → Boss-Extrude8 (add)
    with BuildSketch(Plane(origin=(0, -26.001751313, 0), x_dir=(1, 0, 0), z_dir=(0, 1, 0))):
        Polygon((77, -24.320490368), (63, -24.320490368), (60.2, -12.320490368), (77, -12.320490368), align=None)
    extrude(amount=BOSS_EXTRUDE8_DEPTH)

    # Sketch31 → Cut-Extrude17 (cut, through all)
    with BuildSketch(Plane(origin=(0, -6.001751313, 0), x_dir=(1, 0, 0), z_dir=(0, 1, 0))):
        with Locations(Location((72, -21.320490368, 0), (0, 0, 270))):
            Circle(SKETCH31_R)
    extrude(amount=-CUT_EXTRUDE17_DEPTH, mode=Mode.SUBTRACT)

    # Sketch32 → Cut-Extrude18 (cut)
    with BuildSketch(Plane.XZ.offset(29.001751313)):
        Polygon((72, 24.570490368), (69.185417438, 22.945490368), (69.185417438, 19.695490368), (72, 18.070490368), (74.814582562, 19.695490368), (74.814582562, 22.945490368), align=None)
    extrude(amount=-CUT_EXTRUDE18_DEPTH, mode=Mode.SUBTRACT)

    # Sketch33 → Cut-Extrude19 (cut, up to next)
    with BuildSketch(Plane(origin=(0, -2.001751313, 0), x_dir=(1, 0, 0), z_dir=(0, 1, 0)), mode=Mode.PRIVATE) as cut_extrude19_sk1:
        with Locations((72, 43.179509632)):
            Rectangle(SKETCH33_W, SKETCH33_H)
    cut_extrude19_tool1 = extrude(cut_extrude19_sk1.sketch, amount=-CUT_EXTRUDE19_REACH, mode=Mode.PRIVATE) & part.part
    add(cut_extrude19_tool1.solids().sort_by_distance((72, -2.001751, -43.17951))[0], mode=Mode.SUBTRACT)

    # Sketch34 → Cut-Extrude20 (cut, through all)
    with BuildSketch(Plane(origin=(0, 20.998248687, 0), x_dir=(1, 0, 0), z_dir=(0, 1, 0))):
        with Locations(Location((40, -17.320490368, 0), (0, 0, 270))):
            Circle(SKETCH34_R)
    extrude(amount=-CUT_EXTRUDE20_DEPTH, mode=Mode.SUBTRACT)

    # Sketch36 → Cut-Extrude22 (cut)
    with BuildSketch(Plane.XZ.offset(29.001751313)):
        Polygon((38.375, 20.13507293), (36.75, 17.320490368), (38.375, 14.505907805), (41.625, 14.505907805), (43.25, 17.320490368), (41.625, 20.13507293), align=None)
    extrude(amount=-CUT_EXTRUDE22_DEPTH, mode=Mode.SUBTRACT)


solid = part.part
